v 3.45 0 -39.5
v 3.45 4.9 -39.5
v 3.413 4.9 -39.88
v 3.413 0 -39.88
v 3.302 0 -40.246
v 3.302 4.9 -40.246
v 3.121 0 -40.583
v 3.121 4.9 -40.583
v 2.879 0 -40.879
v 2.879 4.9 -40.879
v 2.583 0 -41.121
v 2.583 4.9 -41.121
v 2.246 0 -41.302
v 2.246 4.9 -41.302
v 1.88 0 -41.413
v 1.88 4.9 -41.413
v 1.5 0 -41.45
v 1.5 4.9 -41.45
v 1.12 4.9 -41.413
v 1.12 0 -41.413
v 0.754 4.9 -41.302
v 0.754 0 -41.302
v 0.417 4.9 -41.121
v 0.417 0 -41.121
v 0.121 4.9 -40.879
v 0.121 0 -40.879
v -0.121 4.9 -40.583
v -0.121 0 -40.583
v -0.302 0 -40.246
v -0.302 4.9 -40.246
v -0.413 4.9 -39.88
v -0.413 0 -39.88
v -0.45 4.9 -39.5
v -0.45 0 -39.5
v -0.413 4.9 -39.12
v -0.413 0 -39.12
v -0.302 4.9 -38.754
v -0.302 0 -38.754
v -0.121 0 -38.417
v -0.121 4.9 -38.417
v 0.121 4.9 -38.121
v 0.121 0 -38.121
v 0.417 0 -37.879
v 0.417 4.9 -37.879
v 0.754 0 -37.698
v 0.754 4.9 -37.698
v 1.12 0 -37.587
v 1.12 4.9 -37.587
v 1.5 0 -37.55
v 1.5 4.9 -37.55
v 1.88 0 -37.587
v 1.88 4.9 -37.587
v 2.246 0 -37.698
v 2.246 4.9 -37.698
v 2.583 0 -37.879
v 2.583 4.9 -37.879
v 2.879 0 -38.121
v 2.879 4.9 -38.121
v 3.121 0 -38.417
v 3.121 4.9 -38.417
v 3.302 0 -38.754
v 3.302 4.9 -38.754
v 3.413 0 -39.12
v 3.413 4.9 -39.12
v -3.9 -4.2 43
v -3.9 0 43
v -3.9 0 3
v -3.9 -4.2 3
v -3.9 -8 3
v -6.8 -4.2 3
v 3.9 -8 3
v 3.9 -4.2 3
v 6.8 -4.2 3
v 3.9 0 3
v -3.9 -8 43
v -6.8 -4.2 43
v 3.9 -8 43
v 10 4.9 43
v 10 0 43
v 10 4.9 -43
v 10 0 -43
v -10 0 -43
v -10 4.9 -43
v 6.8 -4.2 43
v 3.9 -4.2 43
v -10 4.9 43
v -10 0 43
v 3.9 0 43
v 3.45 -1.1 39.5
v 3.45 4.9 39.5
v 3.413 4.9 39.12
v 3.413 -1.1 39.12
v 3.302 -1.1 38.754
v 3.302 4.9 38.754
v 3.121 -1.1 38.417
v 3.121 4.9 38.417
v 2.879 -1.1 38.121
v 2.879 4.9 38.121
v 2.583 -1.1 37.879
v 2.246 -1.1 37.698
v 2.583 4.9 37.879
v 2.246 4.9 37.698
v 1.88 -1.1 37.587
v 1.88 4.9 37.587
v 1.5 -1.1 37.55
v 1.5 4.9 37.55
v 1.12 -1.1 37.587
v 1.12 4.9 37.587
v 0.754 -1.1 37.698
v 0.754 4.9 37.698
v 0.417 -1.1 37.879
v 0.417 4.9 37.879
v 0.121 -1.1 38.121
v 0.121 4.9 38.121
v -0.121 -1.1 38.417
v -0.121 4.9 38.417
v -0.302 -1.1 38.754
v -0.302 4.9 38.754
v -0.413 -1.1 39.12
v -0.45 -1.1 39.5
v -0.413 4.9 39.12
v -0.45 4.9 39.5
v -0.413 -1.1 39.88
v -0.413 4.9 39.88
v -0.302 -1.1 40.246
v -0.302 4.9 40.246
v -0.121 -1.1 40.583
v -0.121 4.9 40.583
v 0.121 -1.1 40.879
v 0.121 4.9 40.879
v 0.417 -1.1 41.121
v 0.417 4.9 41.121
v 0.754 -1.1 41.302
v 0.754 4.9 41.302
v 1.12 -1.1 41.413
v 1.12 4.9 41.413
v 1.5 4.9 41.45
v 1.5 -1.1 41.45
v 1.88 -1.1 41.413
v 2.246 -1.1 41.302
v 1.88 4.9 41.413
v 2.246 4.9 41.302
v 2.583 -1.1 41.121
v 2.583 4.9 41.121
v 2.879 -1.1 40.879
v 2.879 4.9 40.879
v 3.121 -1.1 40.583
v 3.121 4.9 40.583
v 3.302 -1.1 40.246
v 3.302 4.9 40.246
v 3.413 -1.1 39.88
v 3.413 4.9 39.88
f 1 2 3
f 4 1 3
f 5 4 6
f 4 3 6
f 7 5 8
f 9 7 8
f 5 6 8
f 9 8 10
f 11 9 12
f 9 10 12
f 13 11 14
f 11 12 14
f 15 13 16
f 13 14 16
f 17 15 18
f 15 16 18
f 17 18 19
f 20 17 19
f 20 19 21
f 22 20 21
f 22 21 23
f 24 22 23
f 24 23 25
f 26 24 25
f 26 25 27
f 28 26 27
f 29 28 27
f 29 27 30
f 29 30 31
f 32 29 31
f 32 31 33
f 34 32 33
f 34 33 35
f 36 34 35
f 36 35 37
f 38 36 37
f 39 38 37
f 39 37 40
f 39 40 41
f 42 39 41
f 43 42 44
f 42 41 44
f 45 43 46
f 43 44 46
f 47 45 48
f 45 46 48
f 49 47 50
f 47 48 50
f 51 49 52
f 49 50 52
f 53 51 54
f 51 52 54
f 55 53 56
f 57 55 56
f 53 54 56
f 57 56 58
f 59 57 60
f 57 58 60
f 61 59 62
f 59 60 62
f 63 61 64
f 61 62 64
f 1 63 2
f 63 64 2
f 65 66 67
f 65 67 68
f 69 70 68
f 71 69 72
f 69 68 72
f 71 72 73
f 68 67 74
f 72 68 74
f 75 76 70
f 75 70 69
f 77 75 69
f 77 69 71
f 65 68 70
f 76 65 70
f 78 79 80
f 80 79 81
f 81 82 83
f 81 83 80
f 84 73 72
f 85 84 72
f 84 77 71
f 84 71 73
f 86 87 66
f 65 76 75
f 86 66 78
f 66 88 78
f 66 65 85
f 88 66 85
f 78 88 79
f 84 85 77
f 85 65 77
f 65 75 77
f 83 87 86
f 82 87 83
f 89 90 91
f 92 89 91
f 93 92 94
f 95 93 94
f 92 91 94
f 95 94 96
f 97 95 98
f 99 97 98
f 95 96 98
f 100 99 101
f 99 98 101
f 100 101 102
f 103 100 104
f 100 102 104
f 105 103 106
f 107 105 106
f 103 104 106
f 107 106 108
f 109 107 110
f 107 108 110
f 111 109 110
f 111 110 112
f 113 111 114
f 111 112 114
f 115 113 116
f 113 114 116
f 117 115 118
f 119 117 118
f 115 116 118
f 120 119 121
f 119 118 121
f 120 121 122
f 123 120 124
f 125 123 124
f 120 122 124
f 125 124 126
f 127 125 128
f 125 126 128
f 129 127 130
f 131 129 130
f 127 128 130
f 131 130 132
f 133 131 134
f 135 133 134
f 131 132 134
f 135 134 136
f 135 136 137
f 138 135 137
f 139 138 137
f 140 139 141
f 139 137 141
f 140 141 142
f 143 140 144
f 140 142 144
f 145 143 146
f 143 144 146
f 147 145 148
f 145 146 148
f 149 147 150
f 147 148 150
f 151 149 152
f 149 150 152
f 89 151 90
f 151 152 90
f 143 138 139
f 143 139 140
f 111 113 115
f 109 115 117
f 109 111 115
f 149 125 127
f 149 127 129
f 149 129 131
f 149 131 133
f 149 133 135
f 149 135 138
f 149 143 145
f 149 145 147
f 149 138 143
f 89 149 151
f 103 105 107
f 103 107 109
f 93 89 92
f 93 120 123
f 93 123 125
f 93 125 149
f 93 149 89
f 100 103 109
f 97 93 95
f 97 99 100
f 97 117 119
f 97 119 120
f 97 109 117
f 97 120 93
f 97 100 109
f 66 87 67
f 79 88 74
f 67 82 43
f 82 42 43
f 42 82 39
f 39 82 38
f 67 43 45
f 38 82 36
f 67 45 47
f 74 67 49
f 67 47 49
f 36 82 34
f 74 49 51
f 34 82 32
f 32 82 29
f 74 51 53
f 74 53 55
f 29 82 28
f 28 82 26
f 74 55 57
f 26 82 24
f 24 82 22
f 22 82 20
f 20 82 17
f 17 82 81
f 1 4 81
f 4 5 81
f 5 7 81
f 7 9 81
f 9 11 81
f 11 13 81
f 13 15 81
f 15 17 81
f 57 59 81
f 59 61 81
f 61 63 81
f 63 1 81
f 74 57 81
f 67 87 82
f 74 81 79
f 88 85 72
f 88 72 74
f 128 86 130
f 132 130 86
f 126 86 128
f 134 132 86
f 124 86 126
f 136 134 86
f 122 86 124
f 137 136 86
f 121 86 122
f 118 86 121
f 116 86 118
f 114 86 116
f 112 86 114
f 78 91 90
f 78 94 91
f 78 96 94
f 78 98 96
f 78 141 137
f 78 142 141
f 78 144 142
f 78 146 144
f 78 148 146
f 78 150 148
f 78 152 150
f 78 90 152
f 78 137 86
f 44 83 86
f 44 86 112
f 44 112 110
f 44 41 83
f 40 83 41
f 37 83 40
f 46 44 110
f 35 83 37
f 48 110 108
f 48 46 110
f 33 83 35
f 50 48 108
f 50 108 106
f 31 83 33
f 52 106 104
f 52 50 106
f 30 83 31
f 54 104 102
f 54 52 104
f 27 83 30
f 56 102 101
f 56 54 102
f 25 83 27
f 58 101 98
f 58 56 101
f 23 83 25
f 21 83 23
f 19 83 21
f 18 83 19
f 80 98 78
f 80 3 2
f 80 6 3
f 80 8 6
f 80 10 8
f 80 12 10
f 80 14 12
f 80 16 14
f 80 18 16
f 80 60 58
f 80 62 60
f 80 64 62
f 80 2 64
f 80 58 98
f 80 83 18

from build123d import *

# Parameters (mm, degrees)
SKETCH1_W           = 20
SKETCH1_H           = 86
BOSS_EXTRUDE1_DEPTH = 4.9
BOSS_EXTRUDE4_DEPTH = 40
SKETCH2_R           = 1.95
CUT_EXTRUDE1_DEPTH  = 6


with BuildPart() as part:
    # Sketch1 → Boss-Extrude1 (new body)
    with BuildSketch(Plane(origin=(0, 0, 0), x_dir=(1, 0, 0), z_dir=(0, 1, 0))):
        Rectangle(SKETCH1_W, SKETCH1_H)
    extrude(amount=BOSS_EXTRUDE1_DEPTH)

    # Sketch4 → Boss-Extrude4 (add)
    with BuildSketch(Plane.XY.offset(43)):
        Polygon((-3.9, 0), (-3.9, -4.2), (-6.8, -4.2), (-3.9, -8), (3.9, -8), (6.8, -4.2), (3.9, -4.2), (3.9, 0), align=None)
    extrude(amount=-BOSS_EXTRUDE4_DEPTH)

    # Sketch2 → Cut-Extrude1 (cut)
    with BuildSketch(Plane(origin=(0, 4.9, 0), x_dir=(1, 0, 0), z_dir=(0, 1, 0))):
        with Locations((1.5, -39.5)):
            Circle(SKETCH2_R)
        with Locations((1.5, 39.5)):
            Circle(SKETCH2_R)
    extrude(amount=-CUT_EXTRUDE1_DEPTH, mode=Mode.SUBTRACT)


solid = part.part
